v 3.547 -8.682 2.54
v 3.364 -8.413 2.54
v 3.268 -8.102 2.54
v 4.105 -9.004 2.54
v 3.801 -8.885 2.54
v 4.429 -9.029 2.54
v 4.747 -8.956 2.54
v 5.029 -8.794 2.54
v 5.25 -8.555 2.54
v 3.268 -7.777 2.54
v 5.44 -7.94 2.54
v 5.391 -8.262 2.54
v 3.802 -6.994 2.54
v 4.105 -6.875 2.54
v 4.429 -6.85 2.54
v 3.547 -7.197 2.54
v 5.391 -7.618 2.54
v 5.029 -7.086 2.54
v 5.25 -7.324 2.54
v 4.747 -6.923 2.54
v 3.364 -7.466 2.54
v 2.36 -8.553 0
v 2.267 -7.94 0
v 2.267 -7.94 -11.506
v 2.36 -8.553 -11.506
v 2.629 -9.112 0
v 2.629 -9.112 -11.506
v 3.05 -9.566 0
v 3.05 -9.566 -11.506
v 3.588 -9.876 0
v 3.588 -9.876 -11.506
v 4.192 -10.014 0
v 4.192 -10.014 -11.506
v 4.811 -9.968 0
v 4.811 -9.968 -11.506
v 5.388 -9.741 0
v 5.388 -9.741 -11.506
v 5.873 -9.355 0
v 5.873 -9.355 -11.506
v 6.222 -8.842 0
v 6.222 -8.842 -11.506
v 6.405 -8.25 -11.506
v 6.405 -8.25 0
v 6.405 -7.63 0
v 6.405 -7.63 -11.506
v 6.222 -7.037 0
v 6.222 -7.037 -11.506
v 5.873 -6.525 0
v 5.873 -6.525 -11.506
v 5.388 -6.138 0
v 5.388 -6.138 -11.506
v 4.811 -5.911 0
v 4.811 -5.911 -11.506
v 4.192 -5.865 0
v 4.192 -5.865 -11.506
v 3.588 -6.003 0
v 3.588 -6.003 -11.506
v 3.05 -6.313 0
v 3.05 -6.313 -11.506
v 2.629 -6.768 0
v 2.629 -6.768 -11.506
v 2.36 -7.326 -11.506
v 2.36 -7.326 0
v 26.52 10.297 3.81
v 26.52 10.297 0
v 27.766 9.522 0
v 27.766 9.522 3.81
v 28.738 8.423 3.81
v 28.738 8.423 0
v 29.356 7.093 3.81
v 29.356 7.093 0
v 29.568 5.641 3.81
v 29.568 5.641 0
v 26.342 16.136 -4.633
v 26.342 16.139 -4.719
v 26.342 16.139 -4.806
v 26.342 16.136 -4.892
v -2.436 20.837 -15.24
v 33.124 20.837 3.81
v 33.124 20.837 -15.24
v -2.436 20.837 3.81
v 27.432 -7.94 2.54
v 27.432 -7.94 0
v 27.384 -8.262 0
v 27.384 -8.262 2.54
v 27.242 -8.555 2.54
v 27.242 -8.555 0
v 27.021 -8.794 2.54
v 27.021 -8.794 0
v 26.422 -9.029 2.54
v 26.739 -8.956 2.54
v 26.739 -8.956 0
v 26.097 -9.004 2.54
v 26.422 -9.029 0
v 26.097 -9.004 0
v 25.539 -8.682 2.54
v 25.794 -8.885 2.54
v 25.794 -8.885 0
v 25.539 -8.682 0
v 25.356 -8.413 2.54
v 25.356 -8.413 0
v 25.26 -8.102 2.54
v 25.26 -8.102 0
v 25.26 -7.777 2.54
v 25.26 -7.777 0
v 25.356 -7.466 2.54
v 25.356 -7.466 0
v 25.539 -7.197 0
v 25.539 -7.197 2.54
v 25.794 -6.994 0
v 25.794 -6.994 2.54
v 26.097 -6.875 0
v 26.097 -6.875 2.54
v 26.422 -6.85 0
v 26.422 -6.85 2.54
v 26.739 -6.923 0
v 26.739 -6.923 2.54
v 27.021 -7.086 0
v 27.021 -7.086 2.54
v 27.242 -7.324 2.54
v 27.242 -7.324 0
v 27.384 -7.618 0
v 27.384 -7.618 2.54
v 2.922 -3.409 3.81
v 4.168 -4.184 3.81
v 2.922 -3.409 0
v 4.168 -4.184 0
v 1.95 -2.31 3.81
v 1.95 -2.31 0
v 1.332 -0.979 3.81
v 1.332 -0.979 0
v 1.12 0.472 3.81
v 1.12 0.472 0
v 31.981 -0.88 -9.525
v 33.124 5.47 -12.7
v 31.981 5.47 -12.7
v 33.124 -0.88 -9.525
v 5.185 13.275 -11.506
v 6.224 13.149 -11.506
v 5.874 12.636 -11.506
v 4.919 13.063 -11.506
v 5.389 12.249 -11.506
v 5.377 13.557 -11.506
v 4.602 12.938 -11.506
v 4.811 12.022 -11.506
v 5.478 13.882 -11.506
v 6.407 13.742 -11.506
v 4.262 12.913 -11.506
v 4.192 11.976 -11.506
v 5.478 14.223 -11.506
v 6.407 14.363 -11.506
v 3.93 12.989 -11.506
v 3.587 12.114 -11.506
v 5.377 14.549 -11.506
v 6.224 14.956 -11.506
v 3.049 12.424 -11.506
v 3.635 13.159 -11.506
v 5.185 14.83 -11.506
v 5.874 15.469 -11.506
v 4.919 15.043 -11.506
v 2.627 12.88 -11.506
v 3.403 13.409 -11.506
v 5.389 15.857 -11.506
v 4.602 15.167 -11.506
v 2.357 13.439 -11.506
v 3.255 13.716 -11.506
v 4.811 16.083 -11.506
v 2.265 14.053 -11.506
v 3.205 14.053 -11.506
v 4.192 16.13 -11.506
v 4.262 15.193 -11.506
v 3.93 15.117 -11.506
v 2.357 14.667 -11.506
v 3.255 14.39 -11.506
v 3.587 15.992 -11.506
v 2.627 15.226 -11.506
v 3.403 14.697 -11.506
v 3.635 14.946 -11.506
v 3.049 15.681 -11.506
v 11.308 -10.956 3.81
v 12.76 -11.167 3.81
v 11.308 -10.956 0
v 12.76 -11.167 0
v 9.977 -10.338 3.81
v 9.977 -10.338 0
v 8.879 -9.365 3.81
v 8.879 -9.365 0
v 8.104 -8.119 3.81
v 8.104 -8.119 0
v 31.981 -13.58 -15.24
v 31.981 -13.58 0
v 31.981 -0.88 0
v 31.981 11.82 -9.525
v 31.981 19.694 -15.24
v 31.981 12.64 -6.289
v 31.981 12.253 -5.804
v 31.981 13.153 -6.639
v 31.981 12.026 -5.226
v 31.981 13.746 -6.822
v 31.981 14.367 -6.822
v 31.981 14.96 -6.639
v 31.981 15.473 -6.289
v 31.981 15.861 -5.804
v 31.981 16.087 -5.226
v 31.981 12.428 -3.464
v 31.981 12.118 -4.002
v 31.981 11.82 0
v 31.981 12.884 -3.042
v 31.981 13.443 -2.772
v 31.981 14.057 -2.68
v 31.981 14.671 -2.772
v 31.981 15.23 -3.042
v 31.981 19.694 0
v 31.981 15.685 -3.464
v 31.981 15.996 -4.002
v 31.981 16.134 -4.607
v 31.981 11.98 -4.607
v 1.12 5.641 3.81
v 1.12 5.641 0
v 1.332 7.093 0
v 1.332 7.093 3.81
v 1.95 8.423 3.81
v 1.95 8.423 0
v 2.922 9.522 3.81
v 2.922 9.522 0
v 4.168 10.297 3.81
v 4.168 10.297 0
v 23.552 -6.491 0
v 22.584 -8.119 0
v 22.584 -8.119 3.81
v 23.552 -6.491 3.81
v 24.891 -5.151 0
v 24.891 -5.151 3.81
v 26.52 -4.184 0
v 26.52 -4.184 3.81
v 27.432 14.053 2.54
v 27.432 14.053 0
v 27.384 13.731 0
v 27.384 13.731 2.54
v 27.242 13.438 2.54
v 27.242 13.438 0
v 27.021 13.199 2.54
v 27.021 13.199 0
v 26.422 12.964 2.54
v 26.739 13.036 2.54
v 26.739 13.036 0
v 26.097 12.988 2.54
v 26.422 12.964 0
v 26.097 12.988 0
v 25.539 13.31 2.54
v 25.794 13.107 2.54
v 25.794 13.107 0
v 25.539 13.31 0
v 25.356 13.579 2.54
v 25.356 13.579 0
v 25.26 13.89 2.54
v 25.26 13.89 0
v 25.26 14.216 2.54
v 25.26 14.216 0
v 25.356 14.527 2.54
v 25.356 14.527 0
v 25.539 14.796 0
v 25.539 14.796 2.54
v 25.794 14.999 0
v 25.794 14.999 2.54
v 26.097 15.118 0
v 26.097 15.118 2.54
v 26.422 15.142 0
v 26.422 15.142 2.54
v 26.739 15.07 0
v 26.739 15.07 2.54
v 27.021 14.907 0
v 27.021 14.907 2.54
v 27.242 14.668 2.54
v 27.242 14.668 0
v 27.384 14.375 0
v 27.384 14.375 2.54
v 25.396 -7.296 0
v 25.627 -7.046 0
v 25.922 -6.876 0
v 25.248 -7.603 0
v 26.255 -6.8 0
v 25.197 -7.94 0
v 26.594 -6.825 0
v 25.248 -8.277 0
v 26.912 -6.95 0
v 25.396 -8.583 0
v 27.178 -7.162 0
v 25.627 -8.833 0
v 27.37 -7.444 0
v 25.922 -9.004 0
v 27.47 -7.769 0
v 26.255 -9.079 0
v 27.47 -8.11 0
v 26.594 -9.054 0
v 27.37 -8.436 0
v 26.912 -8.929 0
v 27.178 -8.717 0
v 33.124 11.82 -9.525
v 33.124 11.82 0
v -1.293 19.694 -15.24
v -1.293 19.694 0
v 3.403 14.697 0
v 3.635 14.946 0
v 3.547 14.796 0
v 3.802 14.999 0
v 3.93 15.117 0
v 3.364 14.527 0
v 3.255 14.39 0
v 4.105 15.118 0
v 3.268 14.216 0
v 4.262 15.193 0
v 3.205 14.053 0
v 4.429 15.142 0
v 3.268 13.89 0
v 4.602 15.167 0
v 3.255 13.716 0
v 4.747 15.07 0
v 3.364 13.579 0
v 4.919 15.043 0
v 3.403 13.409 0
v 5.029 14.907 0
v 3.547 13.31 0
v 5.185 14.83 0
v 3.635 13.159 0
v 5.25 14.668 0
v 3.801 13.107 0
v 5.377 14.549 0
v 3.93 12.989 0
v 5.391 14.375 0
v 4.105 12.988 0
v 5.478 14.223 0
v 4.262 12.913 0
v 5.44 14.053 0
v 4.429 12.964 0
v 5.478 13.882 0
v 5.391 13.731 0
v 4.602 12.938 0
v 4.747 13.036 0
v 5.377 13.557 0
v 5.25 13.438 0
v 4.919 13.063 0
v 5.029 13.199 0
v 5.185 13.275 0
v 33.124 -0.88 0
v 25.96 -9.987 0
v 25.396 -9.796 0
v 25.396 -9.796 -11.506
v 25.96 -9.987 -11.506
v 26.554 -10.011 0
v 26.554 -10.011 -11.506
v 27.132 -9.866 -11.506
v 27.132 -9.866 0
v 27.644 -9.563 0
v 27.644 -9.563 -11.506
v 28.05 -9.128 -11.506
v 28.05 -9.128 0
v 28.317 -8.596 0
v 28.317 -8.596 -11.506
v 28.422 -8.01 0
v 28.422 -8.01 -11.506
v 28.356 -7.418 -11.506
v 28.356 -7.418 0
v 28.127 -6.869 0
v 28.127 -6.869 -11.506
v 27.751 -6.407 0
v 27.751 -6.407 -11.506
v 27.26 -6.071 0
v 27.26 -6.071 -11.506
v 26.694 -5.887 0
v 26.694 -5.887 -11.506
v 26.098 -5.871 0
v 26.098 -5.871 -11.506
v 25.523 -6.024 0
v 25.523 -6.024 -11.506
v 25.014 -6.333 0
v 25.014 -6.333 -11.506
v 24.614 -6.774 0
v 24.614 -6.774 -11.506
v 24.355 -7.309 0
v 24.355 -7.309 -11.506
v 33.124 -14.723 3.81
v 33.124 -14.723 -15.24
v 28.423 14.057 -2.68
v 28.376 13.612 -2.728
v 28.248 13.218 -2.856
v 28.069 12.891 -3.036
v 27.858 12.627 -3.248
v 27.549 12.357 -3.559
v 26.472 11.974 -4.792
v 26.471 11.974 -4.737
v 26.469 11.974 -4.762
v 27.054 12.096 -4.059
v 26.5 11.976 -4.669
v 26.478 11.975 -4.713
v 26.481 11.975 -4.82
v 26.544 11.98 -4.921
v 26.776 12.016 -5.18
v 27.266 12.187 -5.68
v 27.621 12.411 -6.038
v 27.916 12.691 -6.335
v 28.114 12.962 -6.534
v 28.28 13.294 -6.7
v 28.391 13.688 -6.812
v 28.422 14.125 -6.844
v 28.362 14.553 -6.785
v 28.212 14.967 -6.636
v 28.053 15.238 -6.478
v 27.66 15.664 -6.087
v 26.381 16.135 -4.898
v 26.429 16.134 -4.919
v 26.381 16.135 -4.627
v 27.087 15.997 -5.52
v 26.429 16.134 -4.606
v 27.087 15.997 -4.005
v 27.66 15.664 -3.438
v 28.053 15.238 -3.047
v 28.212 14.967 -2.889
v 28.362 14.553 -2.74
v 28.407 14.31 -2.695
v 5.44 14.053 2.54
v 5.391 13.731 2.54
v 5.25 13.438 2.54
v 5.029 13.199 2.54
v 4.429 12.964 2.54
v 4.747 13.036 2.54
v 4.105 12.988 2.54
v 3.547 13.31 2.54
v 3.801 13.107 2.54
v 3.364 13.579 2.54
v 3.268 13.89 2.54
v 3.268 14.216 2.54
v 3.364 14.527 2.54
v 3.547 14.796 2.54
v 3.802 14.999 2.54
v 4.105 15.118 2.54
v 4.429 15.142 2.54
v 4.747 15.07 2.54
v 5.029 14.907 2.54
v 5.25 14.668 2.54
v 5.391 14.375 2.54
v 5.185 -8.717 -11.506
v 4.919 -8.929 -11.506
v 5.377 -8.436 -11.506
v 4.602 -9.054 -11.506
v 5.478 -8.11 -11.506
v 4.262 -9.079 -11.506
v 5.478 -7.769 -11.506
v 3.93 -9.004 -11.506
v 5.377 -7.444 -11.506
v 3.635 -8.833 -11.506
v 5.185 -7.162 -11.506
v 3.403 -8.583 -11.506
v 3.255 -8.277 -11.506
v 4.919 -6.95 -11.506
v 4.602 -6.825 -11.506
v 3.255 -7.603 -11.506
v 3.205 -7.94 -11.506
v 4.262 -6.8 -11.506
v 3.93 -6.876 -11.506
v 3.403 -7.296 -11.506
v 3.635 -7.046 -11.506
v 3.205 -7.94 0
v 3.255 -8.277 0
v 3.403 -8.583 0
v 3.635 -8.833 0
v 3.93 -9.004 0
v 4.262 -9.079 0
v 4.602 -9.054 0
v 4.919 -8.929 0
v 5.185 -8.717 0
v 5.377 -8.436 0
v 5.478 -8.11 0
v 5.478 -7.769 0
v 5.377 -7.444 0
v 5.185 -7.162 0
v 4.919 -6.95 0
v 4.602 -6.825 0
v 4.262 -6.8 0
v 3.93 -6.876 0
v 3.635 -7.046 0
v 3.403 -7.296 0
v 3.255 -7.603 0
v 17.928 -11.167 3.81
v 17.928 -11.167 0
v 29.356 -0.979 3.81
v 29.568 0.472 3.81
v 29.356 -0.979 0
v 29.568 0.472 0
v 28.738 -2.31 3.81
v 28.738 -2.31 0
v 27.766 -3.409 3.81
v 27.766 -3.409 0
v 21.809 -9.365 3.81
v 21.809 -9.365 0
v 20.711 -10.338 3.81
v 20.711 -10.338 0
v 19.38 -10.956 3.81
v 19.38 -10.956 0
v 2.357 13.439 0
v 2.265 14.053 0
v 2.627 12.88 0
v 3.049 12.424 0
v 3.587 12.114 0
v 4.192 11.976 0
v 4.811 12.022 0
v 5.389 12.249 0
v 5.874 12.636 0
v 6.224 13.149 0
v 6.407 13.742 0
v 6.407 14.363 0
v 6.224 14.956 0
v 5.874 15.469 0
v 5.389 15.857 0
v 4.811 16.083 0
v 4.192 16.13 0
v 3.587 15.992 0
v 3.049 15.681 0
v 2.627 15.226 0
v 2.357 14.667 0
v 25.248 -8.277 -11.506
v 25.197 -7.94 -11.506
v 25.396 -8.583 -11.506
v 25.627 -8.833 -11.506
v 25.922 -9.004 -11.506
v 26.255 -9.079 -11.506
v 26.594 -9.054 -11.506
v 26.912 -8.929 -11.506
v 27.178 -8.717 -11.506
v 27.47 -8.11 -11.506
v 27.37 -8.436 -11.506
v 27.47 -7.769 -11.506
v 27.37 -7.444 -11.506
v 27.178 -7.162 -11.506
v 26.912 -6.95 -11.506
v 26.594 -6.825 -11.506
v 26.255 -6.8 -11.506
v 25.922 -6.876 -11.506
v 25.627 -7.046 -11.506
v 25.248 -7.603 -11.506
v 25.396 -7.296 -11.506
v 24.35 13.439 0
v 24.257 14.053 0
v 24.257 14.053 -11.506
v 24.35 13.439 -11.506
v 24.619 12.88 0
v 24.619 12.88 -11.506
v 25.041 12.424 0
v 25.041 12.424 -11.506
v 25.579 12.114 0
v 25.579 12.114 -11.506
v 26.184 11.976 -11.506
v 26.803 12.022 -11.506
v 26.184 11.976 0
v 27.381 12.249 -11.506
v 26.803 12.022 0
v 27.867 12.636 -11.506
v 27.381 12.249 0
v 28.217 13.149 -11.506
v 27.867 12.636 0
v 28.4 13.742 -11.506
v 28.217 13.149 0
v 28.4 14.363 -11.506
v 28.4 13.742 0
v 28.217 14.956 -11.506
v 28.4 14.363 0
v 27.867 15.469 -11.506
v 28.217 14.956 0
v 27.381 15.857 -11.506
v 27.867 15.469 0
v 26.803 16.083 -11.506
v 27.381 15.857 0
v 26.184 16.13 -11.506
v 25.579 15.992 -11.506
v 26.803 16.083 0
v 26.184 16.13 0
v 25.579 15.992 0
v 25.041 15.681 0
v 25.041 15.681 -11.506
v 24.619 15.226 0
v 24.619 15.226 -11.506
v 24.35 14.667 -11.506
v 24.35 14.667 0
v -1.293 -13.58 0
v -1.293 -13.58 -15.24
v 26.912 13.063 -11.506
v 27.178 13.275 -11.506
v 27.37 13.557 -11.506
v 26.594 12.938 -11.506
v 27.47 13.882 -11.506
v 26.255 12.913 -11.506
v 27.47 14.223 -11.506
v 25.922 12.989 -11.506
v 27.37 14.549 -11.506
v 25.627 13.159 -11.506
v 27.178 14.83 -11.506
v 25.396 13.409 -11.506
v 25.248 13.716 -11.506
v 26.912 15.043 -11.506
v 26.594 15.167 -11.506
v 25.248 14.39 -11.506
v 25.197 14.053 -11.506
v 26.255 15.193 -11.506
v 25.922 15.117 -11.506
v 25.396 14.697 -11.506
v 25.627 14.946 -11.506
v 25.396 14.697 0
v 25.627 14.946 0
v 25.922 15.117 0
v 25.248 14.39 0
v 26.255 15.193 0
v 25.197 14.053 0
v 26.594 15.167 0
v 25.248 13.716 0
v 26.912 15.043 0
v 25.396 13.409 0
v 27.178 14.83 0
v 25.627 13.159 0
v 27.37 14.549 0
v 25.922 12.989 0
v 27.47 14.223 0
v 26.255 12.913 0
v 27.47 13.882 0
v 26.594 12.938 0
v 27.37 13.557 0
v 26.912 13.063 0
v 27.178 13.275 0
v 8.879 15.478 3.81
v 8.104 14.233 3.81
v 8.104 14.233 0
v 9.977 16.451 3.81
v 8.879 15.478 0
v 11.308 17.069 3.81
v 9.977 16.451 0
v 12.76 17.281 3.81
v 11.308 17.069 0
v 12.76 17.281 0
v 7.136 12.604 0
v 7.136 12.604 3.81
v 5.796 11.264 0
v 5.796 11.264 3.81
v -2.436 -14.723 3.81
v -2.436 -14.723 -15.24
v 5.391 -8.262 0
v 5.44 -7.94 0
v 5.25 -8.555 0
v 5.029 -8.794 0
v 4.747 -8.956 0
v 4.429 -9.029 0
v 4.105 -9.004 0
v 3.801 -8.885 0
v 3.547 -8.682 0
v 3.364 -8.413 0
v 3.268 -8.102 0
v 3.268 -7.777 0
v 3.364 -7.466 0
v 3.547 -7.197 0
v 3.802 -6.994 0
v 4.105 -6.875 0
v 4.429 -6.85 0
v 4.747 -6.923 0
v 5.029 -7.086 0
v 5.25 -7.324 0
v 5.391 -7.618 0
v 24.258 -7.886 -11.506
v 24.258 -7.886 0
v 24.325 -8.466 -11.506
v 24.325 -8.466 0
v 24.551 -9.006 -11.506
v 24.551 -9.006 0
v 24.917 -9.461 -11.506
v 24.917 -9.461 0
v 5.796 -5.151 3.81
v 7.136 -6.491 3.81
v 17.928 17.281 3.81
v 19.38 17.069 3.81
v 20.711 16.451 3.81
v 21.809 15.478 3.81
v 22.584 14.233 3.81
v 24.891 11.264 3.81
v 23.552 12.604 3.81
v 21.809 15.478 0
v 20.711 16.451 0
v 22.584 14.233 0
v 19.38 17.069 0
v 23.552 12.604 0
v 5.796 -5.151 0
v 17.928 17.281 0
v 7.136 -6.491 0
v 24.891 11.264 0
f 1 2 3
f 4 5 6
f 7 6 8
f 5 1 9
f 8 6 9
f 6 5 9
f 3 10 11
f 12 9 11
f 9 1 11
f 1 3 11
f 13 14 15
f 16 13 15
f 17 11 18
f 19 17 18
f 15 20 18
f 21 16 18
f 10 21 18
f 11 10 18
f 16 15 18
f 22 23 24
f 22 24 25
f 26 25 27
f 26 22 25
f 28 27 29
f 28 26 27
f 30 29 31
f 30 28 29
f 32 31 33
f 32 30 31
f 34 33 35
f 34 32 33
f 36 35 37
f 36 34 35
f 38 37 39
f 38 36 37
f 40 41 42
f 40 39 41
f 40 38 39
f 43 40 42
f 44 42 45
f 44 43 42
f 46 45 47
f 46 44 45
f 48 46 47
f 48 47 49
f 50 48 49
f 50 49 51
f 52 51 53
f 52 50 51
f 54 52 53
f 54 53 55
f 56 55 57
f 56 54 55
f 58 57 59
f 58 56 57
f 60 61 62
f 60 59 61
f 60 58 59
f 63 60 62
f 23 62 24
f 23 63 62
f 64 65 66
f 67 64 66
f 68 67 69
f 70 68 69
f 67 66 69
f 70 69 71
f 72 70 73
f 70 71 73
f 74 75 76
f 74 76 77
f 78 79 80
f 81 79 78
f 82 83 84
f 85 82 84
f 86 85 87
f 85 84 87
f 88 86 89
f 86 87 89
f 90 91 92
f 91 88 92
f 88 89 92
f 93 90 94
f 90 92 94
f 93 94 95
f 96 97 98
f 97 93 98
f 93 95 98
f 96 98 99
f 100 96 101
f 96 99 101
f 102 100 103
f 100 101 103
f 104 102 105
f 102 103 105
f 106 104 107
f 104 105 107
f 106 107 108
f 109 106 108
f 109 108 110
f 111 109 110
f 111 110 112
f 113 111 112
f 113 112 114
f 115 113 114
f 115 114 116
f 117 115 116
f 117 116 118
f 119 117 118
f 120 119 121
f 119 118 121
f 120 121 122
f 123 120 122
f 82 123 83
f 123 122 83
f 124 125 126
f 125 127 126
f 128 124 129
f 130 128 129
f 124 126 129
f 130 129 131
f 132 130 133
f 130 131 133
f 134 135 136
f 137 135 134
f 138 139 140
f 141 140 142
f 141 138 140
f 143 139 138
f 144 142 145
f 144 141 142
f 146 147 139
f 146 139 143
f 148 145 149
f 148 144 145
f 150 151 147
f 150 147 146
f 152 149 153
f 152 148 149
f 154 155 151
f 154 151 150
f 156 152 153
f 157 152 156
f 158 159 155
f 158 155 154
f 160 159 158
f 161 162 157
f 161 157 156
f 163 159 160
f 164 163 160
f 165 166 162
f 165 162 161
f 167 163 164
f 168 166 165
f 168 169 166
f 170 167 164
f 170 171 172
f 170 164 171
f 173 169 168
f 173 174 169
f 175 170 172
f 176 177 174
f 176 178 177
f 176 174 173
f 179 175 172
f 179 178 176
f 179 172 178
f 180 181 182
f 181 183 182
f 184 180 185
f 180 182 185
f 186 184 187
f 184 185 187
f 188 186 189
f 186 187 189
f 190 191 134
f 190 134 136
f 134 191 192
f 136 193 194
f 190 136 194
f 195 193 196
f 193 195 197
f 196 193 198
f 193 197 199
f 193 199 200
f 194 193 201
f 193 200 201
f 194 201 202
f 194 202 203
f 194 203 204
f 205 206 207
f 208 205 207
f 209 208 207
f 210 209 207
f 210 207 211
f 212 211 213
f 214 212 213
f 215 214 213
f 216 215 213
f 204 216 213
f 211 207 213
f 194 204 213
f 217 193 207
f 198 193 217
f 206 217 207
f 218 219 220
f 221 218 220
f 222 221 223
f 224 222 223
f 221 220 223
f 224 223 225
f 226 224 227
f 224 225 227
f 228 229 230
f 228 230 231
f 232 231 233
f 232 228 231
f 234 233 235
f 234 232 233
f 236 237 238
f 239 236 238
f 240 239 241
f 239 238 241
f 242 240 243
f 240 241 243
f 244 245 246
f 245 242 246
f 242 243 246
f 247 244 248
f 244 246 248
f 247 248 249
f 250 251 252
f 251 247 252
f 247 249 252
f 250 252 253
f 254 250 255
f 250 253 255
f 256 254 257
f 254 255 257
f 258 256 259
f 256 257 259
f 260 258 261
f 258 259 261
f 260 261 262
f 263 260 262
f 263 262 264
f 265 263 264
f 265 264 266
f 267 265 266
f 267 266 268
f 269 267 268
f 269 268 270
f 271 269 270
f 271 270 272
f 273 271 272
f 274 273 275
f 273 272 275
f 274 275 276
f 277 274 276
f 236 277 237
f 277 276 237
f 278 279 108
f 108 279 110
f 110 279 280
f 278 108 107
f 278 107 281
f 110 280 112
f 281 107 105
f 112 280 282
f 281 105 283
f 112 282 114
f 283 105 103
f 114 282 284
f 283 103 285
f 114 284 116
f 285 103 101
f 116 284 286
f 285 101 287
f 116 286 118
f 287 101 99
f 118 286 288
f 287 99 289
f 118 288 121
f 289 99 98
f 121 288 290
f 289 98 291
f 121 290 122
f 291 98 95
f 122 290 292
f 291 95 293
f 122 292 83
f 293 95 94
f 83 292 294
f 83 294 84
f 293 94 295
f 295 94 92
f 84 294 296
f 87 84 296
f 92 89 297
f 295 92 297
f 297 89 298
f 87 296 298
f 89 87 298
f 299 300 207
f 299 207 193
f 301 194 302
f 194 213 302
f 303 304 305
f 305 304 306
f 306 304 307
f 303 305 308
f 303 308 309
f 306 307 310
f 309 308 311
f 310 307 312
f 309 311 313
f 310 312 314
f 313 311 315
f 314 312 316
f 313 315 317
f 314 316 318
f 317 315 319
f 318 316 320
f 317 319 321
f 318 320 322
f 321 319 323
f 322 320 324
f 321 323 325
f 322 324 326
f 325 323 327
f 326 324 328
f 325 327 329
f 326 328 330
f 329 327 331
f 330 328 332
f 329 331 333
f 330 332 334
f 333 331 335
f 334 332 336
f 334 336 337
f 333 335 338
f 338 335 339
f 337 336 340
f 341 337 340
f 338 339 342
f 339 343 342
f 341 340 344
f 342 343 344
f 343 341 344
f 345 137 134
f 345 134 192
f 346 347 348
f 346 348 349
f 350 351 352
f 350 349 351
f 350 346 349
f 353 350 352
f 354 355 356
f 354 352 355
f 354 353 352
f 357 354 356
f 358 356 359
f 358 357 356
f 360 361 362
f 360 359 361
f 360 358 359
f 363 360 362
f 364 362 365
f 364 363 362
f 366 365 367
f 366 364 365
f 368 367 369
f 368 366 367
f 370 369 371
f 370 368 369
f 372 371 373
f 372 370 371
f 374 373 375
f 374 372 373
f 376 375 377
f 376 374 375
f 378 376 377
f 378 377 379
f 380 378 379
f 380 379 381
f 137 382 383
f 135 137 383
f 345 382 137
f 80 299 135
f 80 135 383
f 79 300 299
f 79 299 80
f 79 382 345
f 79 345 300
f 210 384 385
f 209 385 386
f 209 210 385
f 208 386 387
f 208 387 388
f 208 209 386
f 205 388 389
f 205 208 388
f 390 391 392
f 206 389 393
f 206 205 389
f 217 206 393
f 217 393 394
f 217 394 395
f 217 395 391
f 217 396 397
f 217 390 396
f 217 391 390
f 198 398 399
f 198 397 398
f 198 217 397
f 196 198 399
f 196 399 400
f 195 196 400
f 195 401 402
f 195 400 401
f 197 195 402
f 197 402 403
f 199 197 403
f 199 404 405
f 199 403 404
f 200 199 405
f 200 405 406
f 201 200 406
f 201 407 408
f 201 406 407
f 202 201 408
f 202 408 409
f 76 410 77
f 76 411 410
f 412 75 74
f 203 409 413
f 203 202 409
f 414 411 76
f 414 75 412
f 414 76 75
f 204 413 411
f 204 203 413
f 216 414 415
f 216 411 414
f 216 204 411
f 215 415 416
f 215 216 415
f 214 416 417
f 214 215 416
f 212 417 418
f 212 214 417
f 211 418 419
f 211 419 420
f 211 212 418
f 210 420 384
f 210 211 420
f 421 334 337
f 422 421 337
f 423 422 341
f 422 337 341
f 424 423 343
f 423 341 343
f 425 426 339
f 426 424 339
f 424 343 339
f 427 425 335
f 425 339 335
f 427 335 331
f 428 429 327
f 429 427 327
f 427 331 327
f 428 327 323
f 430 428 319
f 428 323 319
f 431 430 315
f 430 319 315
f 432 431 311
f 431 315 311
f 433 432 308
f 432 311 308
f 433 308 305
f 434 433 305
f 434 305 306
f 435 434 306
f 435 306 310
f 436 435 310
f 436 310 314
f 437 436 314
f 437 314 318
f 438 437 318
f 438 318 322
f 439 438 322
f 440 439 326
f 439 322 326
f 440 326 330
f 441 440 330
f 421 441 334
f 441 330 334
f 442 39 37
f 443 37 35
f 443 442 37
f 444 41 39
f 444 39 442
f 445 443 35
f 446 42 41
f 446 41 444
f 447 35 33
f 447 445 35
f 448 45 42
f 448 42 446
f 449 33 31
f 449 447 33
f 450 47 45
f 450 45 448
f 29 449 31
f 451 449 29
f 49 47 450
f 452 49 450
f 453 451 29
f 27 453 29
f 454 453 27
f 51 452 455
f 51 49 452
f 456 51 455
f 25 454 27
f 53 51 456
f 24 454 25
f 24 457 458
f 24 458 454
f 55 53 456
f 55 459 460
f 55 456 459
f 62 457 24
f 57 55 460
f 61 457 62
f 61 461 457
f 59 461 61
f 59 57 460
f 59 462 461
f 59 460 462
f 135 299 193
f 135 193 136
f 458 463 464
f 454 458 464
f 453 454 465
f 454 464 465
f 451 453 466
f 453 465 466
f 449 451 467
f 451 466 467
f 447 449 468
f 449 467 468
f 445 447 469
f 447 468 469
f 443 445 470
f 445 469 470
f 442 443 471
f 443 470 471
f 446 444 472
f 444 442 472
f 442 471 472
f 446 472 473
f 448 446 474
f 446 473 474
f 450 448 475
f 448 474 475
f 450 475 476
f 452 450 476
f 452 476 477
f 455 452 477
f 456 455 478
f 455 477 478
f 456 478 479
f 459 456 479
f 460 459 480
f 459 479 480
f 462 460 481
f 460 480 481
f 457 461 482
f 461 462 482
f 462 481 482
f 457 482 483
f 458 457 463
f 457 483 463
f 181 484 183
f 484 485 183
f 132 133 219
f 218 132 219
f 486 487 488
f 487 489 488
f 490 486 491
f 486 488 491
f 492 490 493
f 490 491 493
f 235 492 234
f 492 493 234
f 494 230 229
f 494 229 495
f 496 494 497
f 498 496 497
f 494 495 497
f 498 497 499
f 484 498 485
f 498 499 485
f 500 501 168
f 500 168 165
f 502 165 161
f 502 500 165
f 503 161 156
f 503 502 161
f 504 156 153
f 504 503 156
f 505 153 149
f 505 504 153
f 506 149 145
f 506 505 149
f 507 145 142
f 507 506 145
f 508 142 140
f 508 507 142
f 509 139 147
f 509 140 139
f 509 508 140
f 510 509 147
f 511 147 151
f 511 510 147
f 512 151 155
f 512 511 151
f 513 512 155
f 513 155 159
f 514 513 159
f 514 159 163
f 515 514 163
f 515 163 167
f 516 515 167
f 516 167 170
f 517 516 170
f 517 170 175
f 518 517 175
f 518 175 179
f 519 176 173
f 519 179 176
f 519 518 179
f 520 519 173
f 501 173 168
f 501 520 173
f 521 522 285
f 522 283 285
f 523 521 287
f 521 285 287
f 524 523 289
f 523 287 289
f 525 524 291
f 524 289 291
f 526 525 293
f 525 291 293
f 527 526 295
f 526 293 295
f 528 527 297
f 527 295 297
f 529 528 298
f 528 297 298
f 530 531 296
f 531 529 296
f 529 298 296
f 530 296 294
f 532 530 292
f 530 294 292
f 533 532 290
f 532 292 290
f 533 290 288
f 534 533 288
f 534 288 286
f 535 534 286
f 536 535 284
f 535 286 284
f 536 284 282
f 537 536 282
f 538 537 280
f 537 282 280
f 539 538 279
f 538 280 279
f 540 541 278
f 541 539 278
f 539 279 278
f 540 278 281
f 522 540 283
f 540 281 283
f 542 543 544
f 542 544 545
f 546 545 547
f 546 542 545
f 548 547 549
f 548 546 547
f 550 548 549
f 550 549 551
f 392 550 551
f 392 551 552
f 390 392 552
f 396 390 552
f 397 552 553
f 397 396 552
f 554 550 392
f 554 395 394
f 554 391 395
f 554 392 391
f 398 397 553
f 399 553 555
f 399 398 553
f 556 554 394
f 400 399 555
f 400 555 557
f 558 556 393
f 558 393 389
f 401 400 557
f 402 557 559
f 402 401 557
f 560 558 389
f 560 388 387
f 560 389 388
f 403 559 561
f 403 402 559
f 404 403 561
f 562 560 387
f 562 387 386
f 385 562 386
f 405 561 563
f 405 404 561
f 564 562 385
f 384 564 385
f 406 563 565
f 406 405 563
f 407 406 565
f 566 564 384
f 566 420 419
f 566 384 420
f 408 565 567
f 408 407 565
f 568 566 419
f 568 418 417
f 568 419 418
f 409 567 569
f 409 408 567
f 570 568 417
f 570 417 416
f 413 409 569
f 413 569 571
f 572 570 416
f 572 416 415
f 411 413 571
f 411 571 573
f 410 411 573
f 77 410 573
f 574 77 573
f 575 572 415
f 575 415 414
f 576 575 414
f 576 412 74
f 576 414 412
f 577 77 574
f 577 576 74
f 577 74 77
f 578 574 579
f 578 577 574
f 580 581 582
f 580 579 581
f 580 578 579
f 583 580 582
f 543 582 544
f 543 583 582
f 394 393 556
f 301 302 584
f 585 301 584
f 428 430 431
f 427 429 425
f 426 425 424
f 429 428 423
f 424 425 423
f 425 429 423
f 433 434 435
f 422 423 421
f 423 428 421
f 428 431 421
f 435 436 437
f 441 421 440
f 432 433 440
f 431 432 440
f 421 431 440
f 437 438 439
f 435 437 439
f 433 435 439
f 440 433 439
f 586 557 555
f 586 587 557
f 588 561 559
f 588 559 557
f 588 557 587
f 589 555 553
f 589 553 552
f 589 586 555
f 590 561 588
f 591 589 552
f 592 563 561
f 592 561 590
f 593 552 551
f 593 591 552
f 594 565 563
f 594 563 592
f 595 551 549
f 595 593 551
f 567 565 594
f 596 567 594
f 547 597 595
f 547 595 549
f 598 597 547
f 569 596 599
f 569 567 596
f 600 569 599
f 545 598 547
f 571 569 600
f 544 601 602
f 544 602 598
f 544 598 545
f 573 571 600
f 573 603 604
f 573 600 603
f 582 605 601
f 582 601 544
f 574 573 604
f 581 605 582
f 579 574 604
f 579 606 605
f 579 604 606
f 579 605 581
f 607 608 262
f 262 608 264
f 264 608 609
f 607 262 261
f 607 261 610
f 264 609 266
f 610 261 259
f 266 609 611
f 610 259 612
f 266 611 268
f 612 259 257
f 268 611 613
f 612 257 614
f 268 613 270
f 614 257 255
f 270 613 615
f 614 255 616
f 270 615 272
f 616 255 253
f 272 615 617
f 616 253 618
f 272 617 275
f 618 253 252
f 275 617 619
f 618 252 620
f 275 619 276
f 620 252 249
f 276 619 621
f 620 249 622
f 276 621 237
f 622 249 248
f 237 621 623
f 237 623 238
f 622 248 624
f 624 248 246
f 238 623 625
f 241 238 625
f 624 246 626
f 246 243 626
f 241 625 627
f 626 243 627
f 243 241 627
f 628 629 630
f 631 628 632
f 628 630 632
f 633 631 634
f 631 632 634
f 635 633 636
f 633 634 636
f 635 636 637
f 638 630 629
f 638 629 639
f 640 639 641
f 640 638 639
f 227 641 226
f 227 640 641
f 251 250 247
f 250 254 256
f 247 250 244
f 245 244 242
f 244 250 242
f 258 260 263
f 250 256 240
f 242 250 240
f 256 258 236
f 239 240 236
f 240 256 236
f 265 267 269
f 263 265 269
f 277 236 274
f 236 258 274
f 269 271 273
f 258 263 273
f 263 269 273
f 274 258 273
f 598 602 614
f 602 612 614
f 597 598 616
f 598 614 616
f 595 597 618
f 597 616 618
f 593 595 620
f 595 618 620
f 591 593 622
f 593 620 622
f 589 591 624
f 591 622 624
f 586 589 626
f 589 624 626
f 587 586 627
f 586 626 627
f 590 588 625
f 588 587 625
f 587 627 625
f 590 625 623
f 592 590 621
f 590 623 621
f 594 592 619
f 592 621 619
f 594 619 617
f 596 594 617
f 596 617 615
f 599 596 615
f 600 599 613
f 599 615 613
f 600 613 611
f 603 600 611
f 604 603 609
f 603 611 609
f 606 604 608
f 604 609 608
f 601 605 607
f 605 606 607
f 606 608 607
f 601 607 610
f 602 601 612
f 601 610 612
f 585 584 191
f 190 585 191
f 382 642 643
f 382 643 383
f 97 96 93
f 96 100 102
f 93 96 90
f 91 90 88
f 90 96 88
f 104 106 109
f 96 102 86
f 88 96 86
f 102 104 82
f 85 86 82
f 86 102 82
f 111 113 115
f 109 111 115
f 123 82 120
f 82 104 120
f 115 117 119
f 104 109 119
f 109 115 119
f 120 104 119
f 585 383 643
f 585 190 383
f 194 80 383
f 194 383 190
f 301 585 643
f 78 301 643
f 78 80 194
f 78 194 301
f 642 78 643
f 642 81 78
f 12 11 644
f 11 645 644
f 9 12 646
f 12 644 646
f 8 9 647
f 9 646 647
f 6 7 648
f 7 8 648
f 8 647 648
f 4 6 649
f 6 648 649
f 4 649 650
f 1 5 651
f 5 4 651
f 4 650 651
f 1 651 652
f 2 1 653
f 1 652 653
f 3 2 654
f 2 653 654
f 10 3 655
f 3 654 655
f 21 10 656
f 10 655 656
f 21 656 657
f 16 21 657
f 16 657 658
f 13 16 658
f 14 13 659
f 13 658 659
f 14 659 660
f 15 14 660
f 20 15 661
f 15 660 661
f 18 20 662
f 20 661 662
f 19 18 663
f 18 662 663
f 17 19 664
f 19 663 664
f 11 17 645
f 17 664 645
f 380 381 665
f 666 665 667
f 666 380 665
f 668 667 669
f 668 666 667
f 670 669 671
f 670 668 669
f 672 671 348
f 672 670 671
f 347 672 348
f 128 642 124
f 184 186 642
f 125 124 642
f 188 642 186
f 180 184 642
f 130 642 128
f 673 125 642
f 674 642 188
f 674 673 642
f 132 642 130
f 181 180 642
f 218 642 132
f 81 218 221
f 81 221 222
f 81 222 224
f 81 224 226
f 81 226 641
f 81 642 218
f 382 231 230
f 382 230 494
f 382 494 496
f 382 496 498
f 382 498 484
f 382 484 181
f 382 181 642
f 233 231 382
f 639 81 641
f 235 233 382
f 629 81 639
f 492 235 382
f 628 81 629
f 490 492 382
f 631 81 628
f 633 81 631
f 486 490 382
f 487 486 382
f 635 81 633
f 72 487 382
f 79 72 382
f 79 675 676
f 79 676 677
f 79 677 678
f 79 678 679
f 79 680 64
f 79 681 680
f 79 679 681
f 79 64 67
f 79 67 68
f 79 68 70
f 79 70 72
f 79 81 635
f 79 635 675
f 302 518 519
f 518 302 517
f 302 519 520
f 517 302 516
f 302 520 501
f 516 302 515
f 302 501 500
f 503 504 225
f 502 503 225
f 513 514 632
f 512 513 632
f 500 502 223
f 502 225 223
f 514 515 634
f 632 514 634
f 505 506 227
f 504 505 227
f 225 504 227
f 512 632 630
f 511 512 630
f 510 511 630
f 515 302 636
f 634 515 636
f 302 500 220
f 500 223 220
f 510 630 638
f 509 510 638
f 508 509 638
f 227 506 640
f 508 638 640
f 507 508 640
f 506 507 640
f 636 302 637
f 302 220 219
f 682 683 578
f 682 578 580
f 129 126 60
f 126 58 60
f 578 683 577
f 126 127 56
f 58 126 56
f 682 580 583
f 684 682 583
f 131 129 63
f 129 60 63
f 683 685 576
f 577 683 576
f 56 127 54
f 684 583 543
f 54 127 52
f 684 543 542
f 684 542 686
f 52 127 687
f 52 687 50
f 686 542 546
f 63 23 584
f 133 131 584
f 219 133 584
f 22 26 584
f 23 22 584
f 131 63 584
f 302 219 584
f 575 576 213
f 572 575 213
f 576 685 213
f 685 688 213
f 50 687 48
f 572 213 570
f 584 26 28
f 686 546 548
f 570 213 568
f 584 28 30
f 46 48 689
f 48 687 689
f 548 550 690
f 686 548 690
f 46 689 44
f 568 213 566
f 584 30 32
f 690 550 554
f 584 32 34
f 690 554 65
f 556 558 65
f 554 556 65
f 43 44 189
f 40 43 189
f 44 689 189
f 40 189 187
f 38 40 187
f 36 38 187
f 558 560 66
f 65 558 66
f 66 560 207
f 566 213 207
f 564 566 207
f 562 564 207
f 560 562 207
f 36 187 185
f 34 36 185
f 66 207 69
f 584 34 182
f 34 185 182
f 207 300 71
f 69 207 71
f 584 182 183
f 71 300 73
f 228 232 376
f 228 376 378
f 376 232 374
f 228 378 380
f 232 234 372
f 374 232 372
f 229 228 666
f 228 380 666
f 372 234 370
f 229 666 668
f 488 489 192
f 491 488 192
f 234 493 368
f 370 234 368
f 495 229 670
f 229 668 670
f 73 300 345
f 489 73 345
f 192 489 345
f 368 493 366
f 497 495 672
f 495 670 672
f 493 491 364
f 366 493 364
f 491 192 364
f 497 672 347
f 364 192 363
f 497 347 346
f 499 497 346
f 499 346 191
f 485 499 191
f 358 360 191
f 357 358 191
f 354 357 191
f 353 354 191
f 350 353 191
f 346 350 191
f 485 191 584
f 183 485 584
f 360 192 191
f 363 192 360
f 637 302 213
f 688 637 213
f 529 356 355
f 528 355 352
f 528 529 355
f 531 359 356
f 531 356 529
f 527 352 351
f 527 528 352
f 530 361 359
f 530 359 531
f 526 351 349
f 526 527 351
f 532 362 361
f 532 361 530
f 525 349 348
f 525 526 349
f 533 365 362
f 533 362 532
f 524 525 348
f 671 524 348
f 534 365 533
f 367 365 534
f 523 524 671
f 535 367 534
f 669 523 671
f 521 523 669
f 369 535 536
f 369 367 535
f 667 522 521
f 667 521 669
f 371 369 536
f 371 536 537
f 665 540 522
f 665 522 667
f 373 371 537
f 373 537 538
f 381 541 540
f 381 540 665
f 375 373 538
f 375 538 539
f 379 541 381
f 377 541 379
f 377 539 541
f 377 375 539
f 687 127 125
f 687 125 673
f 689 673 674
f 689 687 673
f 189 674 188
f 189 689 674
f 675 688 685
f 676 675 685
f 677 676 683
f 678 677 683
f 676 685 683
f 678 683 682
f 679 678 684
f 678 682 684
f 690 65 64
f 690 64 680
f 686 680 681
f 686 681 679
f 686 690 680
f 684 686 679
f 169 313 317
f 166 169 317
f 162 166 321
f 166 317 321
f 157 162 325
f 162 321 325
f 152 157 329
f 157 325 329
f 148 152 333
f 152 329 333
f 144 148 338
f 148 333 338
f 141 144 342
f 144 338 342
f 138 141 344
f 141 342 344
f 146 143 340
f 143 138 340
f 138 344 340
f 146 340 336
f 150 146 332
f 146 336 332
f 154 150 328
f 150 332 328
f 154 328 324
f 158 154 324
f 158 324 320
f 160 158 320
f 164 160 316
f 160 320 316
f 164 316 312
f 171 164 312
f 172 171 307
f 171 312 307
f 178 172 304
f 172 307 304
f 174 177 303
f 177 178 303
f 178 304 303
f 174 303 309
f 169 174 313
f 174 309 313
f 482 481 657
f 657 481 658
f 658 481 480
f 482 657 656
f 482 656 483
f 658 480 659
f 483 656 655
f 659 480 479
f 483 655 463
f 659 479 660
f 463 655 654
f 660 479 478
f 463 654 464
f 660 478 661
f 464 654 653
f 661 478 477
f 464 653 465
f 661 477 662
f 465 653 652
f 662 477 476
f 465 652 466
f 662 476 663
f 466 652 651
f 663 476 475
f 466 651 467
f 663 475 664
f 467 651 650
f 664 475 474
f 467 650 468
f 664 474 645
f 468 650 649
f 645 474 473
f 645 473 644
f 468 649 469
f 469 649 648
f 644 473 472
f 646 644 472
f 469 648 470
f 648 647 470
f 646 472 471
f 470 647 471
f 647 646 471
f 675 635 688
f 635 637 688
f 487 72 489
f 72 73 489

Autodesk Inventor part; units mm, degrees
ref_plane "YZ Plane" through (0, 0, 0) normal (1, 0, 0) x (0, 1, 0)
ref_plane "XZ Plane" through (0, 0, 0) normal (0, 1, 0) x (-1, 0, 0)
sketch "Sketch1" plane through (0, 0, 0) normal (0, 0, 1) x (1, 0, 0)
  line L0 (33.1238, 20.8366) -> (-2.4362, 20.8366)
  line L1 (-2.4362, 20.8366) -> (-2.4362, -14.7234)
  line L2 (-2.4362, -14.7234) -> (33.1238, -14.7234)
  line L3 (33.1238, -14.7234) -> (33.1238, 20.8366)
  circle A0 centre (4.3476, -7.9396) radius 1.0922
  circle A1 centre (26.34, -7.9396) radius 1.0922
  circle A2 centre (4.3476, 14.0528) radius 1.0922
  circle A3 centre (26.34, 14.0528) radius 1.0922
  line L4 (32.4234, 14.0528) -> (-3.1366, 14.0528) construction
  line L5 (31.7464, -7.9396) -> (-3.8136, -7.9396) construction
  line L6 (4.3476, 22.271) -> (4.3476, -13.289) construction
  line L7 (26.34, 20.1424) -> (26.34, -15.4176) construction
  point P0 (0, 0)
  dimension "CameraHole" = 2.1844
  dimension "BaseWidth" = 35.56
extrude "Base" add sketch "Sketch1" along normal blind 3.81
sketch "Sketch2" plane through (0, 0, 0) normal (0, 0, -1) x (-1, 0, 0)
  line L0 (-12.7595, 17.2806) -> (-17.9281, 17.2806)
  line L1 (-29.5678, 5.6408) -> (-29.5678, 0.4723)
  line L2 (-1.1198, 0.4723) -> (-1.1198, 5.6408)
  line L3 (2.4362, 20.8366) -> (2.4362, -14.7234) projected
  line L4 (2.4362, -14.7234) -> (-33.1238, -14.7234) projected
  line L5 (-33.1238, 20.8366) -> (2.4362, 20.8366) projected
  line L6 (-31.3438, -12.9434) -> (-31.3438, 19.0566) construction
  line L7 (-31.3438, 19.0566) -> (0.6562, 19.0566) construction
  line L8 (0.6562, 19.0566) -> (0.6562, -12.9434) construction
  circle A0 centre (-26.34, 14.0528) radius 1.0922 construction
  line L9 (-1.041, 19.0566) -> (-1.041, 20.8366) construction
  line L10 (-1.1198, 17.2806) -> (-29.5678, 17.2806)
  line L11 (-29.5678, 17.2806) -> (-29.5678, -11.1674)
  line L12 (-17.9281, -11.1674) -> (-12.7595, -11.1674)
  line L13 (-1.1198, -11.1674) -> (-1.1198, 17.2806)
  arc A1 (-26.5198, 10.2967) -> (-22.584, 14.2326) centre (-29.5678, 17.2806) ccw
  arc A2 (-22.584, -8.1194) -> (-26.5198, -4.1836) centre (-29.5678, -11.1674) ccw
  arc A3 (-4.1678, -4.1836) -> (-8.1037, -8.1194) centre (-1.1198, -11.1674) ccw
  arc A4 (-8.1037, 14.2326) -> (-4.1678, 10.2967) centre (-1.1198, 17.2806) ccw
  arc A5 (-29.5678, 0.4723) -> (-26.5198, -4.1836) centre (-24.4878, 0.4723) ccw
  arc A6 (-26.5198, 10.2967) -> (-29.5678, 5.6408) centre (-24.4878, 5.6408) ccw
  arc A7 (-17.9281, 17.2806) -> (-22.584, 14.2326) centre (-17.9281, 12.2006) ccw
  arc A8 (-8.1037, 14.2326) -> (-12.7595, 17.2806) centre (-12.7595, 12.2006) ccw
  arc A9 (-1.1198, 5.6408) -> (-4.1678, 10.2967) centre (-6.1998, 5.6408) ccw
  arc A10 (-4.1678, -4.1836) -> (-1.1198, 0.4723) centre (-6.1998, 0.4723) ccw
  arc A11 (-12.7595, -11.1674) -> (-8.1037, -8.1194) centre (-12.7595, -6.0874) ccw
  arc A12 (-22.584, -8.1194) -> (-17.9281, -11.1674) centre (-17.9281, -6.0874) ccw
  point P0 (-29.5678, 9.6606)
  point P1 (-21.9478, 17.2806)
  point P2 (-21.9478, -11.1674)
  point P3 (-29.5678, -3.5474)
  point P4 (-1.1198, -3.5474)
  point P5 (-8.7398, -11.1674)
  point P6 (-8.7398, 17.2806)
  point P7 (-1.1198, 9.6606)
  dimension "d13" = 3.556
  dimension "d16" = 3.556
  dimension "d38" = 32
  dimension "d101" = 28.448
  dimension "d102" = 7.62
  dimension "d103" = 7.62
  dimension "d104" = 7.62
  dimension "d105" = 7.62
  dimension "d106" = 5.08
extrude "Open Back" cut sketch "Sketch2" against normal blind 3.81 contours A8 A4 A9 L2 A10 A3 A11 L12 A12 A2 A5 L1 A6 A1 A7 L0
sketch "Sketch4" plane through (0, 0, 0) normal (0, 0, -1) x (-1, 0, 0)
  line L0 (-33.1238, 20.8366) -> (2.4362, 20.8366)
  line L1 (2.4362, 20.8366) -> (2.4362, -14.7234)
  line L2 (2.4362, -14.7234) -> (-33.1238, -14.7234)
  line L3 (-33.1238, -14.7234) -> (-33.1238, 20.8366)
  line L4 (1.2932, -13.5804) -> (-31.9808, -13.5804)
  line L5 (-31.9808, -13.5804) -> (-31.9808, 19.6936)
  line L6 (-31.9808, 19.6936) -> (1.2932, 19.6936)
  line L7 (1.2932, 19.6936) -> (1.2932, -13.5804)
  point P0 (0, 0)
  dimension "d32" = 1.143
  dimension "d33" = 1.143
  dimension "d34" = 1.143
  dimension "d35" = 1.143
extrude "Housing" add sketch "Sketch4" along normal blind 15.24
ref_plane "Work Plane1" through (0, 0, -15.24) normal (0, 0, -1) x (-1, 0, 0)
sketch "Sketch10" plane through (0, 0, 3.81) normal (0, 0, 1) x (1, 0, 0)
  circle A0 centre (4.3476, 14.0528) radius 1.0922 projected
  circle A1 centre (4.3476, 14.0528) radius 1.0922
  circle A2 centre (4.3476, -7.9396) radius 1.0922 projected
  circle A3 centre (4.3476, -7.9396) radius 1.0922
  circle A4 centre (26.34, -7.9396) radius 1.0922 projected
  circle A5 centre (26.34, -7.9396) radius 1.0922
  circle A6 centre (26.34, 14.0528) radius 1.0922 projected
  circle A7 centre (26.34, 14.0528) radius 1.0922
  point P0 (0, 0)
extrude "HoleClosing" add sketch "Sketch10" against normal blind 1.27
sketch "Sketch15" plane through (33.1238, -14.7234, 3.81) normal (1, 0, 0) x (0, 0, -1)
  line L0 (3.81, 34.417) -> (19.05, 34.417) projected
  line L1 (3.81, 34.417) -> (3.81, 1.143) projected
  line L2 (3.81, 1.143) -> (19.05, 1.143) projected
  line L3 (19.05, 34.417) -> (19.05, 1.143) projected
  line L4 (19.05, 34.417) -> (10.16, 34.417)
  line L5 (10.16, 34.417) -> (10.16, 20.193)
  line L6 (13.335, 13.843) -> (3.81, 13.843)
  line L7 (3.81, 13.843) -> (3.81, 26.543)
  line L8 (3.81, 26.543) -> (13.335, 26.543)
  line L9 (10.16, 26.543) -> (13.335, 26.543)
  line L10 (13.335, 26.543) -> (16.51, 20.193)
  line L11 (16.51, 20.193) -> (13.335, 13.843)
  line L12 (10.16, 20.193) -> (3.81, 26.543) construction
  line L13 (10.16, 20.193) -> (3.81, 13.843) construction
  point P0 (3.81, 26.543)
  point P1 (3.81, 13.843)
  dimension "d107" = 8.89
  dimension "d108" = 14.224
extrude "Cable Hole" cut sketch "Sketch15" against normal blind 3.81 contours L8 L10 L11 L6 L1
sketch "Sketch3" plane through (0, 0, 0) normal (0, 0, -1) x (-1, 0, 0)
  circle A0 centre (-4.3476, -7.9396) radius 1.143
  circle A1 centre (-4.3476, -7.9396) radius 2.0805
  circle A2 centre (-4.3476, -7.9396) radius 1.0922 projected
  line L0 (-19.1558, -6.3775) -> (-19.1558, -11.4067) projected
  circle A3 centre (-4.3476, 14.0528) radius 1.143
  circle A4 centre (-4.3476, 14.0528) radius 2.0828
  circle A5 centre (-4.3476, 14.0528) radius 1.0922 projected
  circle A6 centre (-26.34, 14.0528) radius 2.0828
  circle A7 centre (-26.34, 14.0528) radius 1.143
  circle A8 centre (-26.34, 14.0528) radius 1.0922 projected
  arc A9 (-24.3548, -7.3094) -> (-25.3959, -9.7962) centre (-26.34, -7.9396) ccw
  circle A10 centre (-26.34, -7.9396) radius 1.143
  circle A11 centre (-26.34, -7.9396) radius 1.0922 projected
  circle A12 centre (-26.34, -7.9396) radius 2.0828
  point P0 (0, 0)
  point P1 (-24.3548, -7.3094)
  dimension "d21" = 0.9375
  dimension "d26" = 2.286
  dimension "d30" = 2.286
  dimension "d31" = 0.9398
extrude "Pegs" add sketch "Sketch3" along normal blind 11.5062 contours A1 | A4 | A6 | A12 A9
sketch "Sketch16" plane through (31.9808, -13.5804, -15.24) normal (-1, 0, 0) x (0, 0, 1)
  line L0 (15.24, 3.558) -> (3.7338, 3.558) projected
  line L1 (15.24, 7.7236) -> (3.7338, 7.7236) projected
  line L2 (3.7338, 7.7236) -> (3.7338, 3.558)
  line L3 (15.24, 12.7) -> (15.24, 0) projected
  line L4 (3.7338, 7.7236) -> (15.24, 7.7236)
  line L5 (15.24, 7.7236) -> (15.24, 3.558)
  line L6 (15.24, 3.558) -> (3.7338, 3.558)
  circle A0 centre (10.4775, 5.6408) radius 2.0828
  line L7 (12.065, 10.414) -> (12.065, 6.9891)
  line L8 (12.065, 4.2925) -> (12.065, 0)
  line L9 (15.24, 5.6408) -> (12.5603, 5.6408)
  line L10 (8.3947, 5.6408) -> (3.7338, 5.6408)
  line L11 (10.4775, 10.414) -> (10.4775, 7.7236)
  line L12 (10.4775, 3.558) -> (10.4775, 0)
  line L13 (8.89, 10.414) -> (8.89, 6.9891)
  line L14 (8.89, 4.2925) -> (8.89, 0)
  line L15 (10.4775, 5.6408) -> (10.4775, 27.6372)
  circle A1 centre (10.4775, 27.6372) radius 2.0828
  dimension "d116" = 21.9964
  dimension "d117" = 4.1656
extrude "Zip-Tie Attachment" add sketch "Sketch16" along normal blind 5.6388 contours A1
sketch "Sketch17" plane through (26.34, 14.0528, -11.5062) normal (0, 0, -1) x (-1, 0, 0)
  circle A0 centre (0, 0) radius 1.143 projected
  circle A1 centre (0, 0) radius 1.143
extrude "top left hole" cut sketch "Sketch17" against normal blind 11.5062
equation "\"CameraHole\" = CameraHole_1"
equation "\"BaseWidth\" = BaseWidth_1"
equation "\"d16\" = UsbHoletoWall"
equation "\"BaseWidth_1\" = 35.56"
equation "\"CameraHole_1\" = 2.1844"
equation "\"ZiptieHole\" = 5.08"
equation "\"ZiptieHoletoHoleDistance\" = 2 * ZiptieRadius + WireThickness"
equation "\"WireThickness\" = 4.064"
equation "\"ZiptieRadius\" = 2.54"
equation "\"ZiptieToSide\" = 8.89"
equation "\"UsbHoletoWall\" = 3.556"
equation "\"WasherHolder\" = 12.7"
properties part number "V2_MountHousing_3DPrint"
